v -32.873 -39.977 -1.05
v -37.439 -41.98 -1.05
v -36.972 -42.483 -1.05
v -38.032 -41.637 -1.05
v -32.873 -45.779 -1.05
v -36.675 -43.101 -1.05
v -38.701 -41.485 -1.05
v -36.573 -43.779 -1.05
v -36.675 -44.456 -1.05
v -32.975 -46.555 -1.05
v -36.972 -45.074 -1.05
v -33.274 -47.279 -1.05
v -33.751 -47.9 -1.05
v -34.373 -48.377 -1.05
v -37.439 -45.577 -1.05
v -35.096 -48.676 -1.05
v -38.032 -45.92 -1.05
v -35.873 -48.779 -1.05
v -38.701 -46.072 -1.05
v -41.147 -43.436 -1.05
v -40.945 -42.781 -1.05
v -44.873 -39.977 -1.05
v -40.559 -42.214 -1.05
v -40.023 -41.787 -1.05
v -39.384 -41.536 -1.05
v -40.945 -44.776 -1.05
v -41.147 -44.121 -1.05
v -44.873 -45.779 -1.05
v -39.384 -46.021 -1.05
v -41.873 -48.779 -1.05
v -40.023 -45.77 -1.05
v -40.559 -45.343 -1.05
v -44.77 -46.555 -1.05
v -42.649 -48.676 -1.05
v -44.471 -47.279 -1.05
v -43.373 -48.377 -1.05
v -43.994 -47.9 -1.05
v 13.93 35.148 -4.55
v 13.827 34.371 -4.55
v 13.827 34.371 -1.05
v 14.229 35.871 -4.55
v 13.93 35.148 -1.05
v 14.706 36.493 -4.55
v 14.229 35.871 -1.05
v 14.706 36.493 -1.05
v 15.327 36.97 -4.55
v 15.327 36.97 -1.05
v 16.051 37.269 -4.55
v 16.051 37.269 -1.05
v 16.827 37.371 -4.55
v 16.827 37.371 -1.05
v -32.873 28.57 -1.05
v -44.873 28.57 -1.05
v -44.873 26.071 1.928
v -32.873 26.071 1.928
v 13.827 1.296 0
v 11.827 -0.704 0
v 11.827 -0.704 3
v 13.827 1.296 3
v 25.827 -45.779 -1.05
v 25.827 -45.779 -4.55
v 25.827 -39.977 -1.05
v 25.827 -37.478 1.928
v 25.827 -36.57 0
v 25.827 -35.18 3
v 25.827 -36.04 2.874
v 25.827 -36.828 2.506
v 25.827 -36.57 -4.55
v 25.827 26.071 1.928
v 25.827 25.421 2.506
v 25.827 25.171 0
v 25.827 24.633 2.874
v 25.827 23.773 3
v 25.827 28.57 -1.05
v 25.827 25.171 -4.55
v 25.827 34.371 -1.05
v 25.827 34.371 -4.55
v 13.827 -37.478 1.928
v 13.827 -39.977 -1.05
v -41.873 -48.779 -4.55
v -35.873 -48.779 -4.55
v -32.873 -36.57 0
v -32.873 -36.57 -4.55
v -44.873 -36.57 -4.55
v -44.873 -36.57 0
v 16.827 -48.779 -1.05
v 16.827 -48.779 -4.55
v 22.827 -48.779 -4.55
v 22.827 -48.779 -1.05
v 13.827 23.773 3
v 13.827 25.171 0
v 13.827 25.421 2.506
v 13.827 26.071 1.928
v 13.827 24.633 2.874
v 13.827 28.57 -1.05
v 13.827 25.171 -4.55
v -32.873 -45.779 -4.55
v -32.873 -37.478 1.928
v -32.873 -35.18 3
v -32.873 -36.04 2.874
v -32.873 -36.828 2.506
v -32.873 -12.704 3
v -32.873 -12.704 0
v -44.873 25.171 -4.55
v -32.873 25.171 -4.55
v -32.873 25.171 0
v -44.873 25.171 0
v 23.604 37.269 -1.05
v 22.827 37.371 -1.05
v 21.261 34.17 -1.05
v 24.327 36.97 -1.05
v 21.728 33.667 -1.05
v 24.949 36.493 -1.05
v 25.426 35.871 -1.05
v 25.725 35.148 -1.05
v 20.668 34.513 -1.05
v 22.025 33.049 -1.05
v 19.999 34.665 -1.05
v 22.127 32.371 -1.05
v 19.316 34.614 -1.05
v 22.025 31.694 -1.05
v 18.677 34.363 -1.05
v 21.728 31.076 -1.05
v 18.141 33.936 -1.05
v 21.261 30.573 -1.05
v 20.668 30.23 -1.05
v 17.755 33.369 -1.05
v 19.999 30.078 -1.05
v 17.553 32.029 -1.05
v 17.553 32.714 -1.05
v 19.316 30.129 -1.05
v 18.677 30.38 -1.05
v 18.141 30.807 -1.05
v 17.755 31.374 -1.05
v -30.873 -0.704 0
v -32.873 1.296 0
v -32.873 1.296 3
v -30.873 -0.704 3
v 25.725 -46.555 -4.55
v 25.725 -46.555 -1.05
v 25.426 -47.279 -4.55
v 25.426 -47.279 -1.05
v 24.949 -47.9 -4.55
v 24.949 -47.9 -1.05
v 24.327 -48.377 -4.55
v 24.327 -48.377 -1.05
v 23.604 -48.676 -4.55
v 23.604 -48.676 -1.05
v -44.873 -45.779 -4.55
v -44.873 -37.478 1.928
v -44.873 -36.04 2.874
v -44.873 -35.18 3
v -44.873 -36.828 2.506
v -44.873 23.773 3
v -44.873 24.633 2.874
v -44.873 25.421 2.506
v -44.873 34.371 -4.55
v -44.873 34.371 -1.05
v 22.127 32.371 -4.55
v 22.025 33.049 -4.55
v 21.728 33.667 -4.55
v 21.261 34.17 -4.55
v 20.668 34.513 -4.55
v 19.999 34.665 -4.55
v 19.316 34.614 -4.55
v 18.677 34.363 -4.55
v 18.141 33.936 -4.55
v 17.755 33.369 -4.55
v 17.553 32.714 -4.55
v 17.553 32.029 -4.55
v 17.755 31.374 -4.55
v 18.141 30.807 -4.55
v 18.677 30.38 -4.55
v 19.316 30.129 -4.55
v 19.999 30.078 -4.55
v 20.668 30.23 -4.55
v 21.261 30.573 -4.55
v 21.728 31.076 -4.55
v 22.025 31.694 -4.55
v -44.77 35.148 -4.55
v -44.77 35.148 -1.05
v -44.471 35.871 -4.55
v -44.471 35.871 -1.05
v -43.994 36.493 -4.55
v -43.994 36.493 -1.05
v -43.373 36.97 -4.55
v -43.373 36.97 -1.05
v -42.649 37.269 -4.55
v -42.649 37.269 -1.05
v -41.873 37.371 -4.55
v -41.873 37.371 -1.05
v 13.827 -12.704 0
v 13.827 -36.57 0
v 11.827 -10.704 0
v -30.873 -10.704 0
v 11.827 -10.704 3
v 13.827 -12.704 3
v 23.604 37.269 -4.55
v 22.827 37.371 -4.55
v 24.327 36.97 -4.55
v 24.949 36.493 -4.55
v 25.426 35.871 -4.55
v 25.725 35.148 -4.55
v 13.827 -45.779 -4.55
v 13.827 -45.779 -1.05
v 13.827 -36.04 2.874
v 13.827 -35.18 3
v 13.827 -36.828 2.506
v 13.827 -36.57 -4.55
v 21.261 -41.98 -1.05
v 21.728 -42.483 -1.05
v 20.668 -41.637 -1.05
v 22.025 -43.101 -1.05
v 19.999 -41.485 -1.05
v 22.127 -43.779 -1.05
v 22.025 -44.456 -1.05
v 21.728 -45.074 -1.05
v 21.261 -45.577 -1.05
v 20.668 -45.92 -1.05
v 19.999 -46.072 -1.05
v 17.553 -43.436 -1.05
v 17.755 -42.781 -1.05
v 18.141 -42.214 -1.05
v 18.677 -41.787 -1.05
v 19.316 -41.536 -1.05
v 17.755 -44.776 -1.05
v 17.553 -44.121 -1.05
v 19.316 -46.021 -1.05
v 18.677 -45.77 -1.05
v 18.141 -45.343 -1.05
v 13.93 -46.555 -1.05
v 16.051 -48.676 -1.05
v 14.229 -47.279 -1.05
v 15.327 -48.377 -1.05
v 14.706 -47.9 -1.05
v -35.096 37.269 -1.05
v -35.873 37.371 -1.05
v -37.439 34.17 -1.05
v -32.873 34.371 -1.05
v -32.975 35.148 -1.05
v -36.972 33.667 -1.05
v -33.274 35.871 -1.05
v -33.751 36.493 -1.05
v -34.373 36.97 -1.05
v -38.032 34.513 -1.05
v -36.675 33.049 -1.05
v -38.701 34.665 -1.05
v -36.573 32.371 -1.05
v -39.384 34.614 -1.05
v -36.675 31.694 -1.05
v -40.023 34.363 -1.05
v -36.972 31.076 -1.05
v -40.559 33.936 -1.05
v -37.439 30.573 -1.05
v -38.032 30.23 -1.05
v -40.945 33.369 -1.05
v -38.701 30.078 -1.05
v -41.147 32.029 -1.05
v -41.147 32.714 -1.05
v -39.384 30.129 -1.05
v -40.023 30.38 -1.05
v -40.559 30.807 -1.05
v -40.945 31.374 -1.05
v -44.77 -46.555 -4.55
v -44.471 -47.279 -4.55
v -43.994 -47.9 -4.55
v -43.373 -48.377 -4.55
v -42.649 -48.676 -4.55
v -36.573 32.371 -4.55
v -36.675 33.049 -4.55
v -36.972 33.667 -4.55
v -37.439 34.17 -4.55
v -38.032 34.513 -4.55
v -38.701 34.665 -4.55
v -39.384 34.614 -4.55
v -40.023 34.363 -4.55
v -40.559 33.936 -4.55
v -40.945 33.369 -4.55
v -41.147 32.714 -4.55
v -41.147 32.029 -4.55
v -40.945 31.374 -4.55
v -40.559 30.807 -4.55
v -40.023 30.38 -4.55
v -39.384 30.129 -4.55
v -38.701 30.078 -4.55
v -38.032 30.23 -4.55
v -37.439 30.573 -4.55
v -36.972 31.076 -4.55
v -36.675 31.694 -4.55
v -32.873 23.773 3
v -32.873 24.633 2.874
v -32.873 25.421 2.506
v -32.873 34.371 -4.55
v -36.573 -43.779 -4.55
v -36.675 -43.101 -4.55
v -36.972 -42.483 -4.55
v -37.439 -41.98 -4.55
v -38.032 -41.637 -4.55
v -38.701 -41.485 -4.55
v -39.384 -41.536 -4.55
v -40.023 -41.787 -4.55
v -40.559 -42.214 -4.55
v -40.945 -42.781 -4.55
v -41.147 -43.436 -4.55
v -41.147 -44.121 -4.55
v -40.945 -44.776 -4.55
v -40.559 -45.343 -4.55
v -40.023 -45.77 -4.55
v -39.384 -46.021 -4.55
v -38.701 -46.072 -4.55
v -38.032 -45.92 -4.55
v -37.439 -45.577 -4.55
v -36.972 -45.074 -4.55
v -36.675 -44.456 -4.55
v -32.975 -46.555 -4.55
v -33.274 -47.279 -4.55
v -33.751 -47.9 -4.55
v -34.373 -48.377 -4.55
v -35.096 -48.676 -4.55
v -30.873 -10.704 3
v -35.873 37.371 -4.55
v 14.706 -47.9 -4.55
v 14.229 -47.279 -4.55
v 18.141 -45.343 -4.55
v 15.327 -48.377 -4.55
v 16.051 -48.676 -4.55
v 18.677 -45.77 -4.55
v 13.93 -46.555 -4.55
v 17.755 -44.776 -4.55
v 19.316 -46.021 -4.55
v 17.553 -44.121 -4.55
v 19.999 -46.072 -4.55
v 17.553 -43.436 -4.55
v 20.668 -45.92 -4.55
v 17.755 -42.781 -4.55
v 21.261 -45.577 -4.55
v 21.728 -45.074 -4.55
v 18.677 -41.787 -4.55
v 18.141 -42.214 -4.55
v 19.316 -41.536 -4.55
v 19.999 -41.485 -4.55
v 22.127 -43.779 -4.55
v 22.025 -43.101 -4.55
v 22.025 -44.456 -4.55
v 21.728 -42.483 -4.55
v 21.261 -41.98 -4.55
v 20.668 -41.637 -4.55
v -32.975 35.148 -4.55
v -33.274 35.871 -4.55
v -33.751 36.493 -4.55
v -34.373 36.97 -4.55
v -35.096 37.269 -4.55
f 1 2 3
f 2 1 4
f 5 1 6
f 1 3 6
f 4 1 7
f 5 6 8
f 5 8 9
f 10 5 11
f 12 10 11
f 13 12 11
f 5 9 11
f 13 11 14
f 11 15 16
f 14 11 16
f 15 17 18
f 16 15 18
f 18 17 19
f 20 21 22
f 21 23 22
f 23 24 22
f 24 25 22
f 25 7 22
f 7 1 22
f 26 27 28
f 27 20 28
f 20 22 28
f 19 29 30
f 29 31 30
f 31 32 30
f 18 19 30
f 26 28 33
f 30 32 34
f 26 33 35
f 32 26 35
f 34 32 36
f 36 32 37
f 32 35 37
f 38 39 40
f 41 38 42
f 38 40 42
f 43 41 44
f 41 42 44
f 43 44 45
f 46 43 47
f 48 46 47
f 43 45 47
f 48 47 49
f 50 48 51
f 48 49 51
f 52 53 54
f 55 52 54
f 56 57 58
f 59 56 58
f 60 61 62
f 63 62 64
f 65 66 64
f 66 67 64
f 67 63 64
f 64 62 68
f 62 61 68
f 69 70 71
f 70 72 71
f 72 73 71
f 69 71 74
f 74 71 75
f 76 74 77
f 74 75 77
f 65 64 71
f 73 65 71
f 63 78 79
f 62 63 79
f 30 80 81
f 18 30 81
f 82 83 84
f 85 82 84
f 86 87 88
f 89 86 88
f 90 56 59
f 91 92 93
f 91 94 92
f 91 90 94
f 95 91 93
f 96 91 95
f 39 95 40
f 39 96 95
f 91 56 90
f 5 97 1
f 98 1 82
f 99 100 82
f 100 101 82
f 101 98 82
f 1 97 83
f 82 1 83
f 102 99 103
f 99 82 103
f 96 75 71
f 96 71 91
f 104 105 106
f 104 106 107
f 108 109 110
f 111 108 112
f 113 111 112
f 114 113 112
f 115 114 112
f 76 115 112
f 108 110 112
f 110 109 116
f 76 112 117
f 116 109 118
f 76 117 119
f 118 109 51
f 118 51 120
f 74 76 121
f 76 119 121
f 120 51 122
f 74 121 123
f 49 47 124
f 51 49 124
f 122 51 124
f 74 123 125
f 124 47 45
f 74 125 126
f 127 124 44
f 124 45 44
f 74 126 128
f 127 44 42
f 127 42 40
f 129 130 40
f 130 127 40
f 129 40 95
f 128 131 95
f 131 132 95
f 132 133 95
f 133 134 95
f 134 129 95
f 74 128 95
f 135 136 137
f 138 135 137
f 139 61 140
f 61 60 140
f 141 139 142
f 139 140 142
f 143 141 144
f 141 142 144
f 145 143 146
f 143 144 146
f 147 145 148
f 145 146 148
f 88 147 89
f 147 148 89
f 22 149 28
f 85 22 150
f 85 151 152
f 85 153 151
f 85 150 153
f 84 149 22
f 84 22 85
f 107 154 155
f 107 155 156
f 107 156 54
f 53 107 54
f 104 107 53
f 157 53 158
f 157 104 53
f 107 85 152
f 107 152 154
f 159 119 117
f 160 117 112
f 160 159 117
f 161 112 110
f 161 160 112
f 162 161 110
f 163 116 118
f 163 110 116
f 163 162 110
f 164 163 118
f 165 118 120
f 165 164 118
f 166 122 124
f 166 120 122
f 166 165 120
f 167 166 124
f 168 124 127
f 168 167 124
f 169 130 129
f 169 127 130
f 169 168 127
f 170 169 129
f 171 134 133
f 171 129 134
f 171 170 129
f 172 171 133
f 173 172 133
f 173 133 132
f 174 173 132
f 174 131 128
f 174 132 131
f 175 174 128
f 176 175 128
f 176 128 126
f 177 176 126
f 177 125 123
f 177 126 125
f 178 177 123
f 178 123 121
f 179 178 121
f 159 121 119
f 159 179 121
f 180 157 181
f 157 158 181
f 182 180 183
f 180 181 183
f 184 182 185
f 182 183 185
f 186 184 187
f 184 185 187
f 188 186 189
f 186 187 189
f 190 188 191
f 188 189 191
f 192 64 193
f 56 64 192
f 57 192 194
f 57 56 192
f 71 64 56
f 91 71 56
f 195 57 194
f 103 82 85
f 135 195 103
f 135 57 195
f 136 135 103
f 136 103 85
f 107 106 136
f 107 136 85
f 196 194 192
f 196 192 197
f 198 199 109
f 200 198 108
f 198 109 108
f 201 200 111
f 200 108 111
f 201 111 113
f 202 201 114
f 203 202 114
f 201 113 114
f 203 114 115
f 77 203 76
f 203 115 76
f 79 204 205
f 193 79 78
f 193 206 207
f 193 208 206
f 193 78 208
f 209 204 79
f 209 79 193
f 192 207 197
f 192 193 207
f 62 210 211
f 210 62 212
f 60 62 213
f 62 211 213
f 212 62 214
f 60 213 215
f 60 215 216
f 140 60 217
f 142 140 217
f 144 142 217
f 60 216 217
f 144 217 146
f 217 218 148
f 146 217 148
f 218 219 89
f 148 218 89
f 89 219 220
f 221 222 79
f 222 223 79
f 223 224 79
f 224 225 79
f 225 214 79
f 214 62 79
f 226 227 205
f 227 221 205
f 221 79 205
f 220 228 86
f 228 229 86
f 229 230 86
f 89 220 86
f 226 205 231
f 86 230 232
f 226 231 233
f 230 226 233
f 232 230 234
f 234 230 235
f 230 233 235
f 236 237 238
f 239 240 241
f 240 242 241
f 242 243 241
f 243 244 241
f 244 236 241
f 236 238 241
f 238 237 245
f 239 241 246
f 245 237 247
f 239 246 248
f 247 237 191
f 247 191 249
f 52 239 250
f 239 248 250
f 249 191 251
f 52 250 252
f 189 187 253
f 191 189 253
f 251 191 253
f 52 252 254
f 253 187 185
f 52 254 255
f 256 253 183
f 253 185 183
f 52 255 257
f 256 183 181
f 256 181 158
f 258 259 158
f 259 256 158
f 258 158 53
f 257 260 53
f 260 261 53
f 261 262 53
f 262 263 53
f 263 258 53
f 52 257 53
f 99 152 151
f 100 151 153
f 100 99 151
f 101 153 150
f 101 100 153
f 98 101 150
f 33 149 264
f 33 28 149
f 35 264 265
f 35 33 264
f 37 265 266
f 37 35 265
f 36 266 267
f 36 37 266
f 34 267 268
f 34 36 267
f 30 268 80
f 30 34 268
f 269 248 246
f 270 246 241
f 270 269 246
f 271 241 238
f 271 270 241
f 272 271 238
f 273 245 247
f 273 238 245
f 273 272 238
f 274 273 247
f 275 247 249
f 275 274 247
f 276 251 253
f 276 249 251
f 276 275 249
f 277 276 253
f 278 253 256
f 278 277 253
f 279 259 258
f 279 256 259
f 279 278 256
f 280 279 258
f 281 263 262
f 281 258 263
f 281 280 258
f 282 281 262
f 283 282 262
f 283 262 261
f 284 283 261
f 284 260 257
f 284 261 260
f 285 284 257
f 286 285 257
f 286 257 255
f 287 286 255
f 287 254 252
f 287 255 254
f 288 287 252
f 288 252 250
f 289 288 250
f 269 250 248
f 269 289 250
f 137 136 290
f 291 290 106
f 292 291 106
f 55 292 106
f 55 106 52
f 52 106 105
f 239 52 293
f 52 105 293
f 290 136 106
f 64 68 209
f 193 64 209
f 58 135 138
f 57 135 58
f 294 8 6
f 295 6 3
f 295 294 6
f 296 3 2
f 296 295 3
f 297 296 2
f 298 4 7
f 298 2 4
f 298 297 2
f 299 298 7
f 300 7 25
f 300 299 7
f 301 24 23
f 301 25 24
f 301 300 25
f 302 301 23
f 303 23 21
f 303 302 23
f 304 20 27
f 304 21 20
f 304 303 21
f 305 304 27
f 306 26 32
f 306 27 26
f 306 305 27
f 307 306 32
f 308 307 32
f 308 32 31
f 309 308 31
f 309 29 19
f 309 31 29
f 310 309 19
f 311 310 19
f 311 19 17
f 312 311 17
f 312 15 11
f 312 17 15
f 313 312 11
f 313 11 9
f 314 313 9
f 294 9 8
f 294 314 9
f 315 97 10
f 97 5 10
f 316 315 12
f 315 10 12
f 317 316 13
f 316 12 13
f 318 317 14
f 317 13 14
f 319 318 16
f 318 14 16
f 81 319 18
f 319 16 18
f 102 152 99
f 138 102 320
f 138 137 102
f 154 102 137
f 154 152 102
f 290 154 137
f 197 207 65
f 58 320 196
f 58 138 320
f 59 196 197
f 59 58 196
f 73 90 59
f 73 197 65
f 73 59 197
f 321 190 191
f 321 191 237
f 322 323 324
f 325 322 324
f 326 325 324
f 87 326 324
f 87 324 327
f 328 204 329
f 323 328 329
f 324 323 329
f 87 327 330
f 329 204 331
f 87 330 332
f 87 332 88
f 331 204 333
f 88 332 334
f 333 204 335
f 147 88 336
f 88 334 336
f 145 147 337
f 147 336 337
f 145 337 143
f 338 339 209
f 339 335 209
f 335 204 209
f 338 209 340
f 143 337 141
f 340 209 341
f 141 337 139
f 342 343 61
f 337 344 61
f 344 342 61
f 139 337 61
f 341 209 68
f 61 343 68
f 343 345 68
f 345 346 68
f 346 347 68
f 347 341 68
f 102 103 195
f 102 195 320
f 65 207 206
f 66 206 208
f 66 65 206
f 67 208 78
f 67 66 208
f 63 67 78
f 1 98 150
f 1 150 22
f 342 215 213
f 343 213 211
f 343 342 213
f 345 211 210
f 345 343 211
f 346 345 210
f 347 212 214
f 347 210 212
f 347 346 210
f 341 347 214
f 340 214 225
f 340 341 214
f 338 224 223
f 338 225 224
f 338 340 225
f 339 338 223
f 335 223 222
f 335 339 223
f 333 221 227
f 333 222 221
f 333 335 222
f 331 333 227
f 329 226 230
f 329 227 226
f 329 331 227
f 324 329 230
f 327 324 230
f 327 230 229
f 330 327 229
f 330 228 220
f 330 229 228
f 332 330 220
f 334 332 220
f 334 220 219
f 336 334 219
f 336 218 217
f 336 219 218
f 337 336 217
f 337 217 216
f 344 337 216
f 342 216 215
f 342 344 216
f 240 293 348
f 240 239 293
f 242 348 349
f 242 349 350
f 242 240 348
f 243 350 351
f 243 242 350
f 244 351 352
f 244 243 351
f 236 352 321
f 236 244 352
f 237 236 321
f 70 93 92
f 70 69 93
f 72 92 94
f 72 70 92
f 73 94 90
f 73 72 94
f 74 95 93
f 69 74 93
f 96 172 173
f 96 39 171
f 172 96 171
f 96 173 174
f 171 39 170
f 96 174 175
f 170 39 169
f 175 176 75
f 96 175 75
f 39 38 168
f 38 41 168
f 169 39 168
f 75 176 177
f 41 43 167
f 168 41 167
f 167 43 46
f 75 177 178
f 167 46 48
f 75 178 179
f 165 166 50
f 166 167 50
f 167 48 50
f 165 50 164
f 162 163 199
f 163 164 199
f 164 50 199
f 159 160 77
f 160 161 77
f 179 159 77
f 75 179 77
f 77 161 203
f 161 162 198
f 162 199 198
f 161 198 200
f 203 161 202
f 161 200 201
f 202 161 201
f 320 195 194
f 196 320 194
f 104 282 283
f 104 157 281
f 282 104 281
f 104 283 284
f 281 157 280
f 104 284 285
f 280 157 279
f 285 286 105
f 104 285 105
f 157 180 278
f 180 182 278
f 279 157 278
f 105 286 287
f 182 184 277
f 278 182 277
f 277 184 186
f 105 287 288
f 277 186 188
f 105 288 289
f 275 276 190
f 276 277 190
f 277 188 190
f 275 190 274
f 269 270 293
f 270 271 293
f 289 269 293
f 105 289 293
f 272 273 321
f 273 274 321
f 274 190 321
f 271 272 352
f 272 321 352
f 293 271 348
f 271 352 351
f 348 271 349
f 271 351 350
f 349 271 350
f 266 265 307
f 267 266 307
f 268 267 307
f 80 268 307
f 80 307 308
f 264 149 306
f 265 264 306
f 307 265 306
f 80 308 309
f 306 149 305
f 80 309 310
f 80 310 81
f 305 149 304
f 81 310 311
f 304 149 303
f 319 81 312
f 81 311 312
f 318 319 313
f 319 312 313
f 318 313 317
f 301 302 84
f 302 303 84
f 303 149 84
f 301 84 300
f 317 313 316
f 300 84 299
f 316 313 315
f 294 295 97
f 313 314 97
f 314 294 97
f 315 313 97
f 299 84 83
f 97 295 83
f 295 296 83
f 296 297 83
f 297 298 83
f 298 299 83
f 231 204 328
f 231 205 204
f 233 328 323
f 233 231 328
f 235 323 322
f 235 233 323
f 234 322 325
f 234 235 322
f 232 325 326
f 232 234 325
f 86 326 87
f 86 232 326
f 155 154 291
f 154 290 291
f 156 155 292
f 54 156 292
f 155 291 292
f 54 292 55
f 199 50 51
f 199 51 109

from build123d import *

# Parameters (mm, degrees)
BOSS_EXTRUDE1_DEPTH      = 3
BOSS_EXTRUDE1_DEPTH_BACK = 4.55
SKETCH1_W                = 12
SKETCH1_H                = 10
SKETCH1_R                = 2.3
SKETCH1_H_2              = 28.075
SKETCH1_W_2              = 46.7
SKETCH5_W                = 12
SKETCH5_H                = 25.875
SKETCH5_H_2              = 10
SKETCH5_H_3              = 25.866
SKETCH5_W_2              = 46.7
CUT_EXTRUDE1_DEPTH       = 4.55
CUT_EXTRUDE2_DEPTH       = 87.014737759
CHAMFER1_SIZE            = 2
FILLET1_R                = 3
FILLET2_R                = 3


with BuildPart() as part:
    # Sketch1 → Boss-Extrude1 (new, two sides: drawn at the far end of the back side and taken through both)
    # profile 1 of 11: a face of its own
    with BuildSketch(Plane.XY.offset(-BOSS_EXTRUDE1_DEPTH_BACK)):
        with Locations((-38.872559152, 32.371494367)):
            Rectangle(SKETCH1_W, SKETCH1_H)
        with Locations((-38.872559152, 32.371494367)):
            Circle(SKETCH1_R, mode=Mode.SUBTRACT)
    # profile 2 of 11: a face of its own
    with BuildSketch(Plane.XY.offset(-BOSS_EXTRUDE1_DEPTH_BACK)):
        with Locations((-38.872559152, 13.333994367)):
            Rectangle(SKETCH1_W, SKETCH1_H_2)
    # profile 3 of 11: a face of its own
    with BuildSketch(Plane.XY.offset(-BOSS_EXTRUDE1_DEPTH_BACK)):
        with Locations((-38.872559152, -5.703505633)):
            Rectangle(SKETCH1_W, SKETCH1_H)
    # profile 4 of 11: a face of its own
    with BuildSketch(Plane.XY.offset(-BOSS_EXTRUDE1_DEPTH_BACK)):
        with Locations((-38.872559152, -24.741005633)):
            Rectangle(SKETCH1_W, SKETCH1_H_2)
    # profile 5 of 11: a face of its own
    with BuildSketch(Plane.XY.offset(-BOSS_EXTRUDE1_DEPTH_BACK)):
        with Locations((-38.872559152, -43.778505633)):
            Rectangle(SKETCH1_W, SKETCH1_H)
        with Locations((-38.872559152, -43.778505633)):
            Circle(SKETCH1_R, mode=Mode.SUBTRACT)
    # profile 6 of 11: a face of its own
    with BuildSketch(Plane.XY.offset(-BOSS_EXTRUDE1_DEPTH_BACK)):
        with Locations((19.827440848, -24.741005633)):
            Rectangle(SKETCH1_W, SKETCH1_H_2)
    # profile 7 of 11: a face of its own
    with BuildSketch(Plane.XY.offset(-BOSS_EXTRUDE1_DEPTH_BACK)):
        with Locations((19.827440848, -43.778505633)):
            Rectangle(SKETCH1_W, SKETCH1_H)
        with Locations((19.827440848, -43.778505633)):
            Circle(SKETCH1_R, mode=Mode.SUBTRACT)
    # profile 8 of 11: a face of its own
    with BuildSketch(Plane.XY.offset(-BOSS_EXTRUDE1_DEPTH_BACK)):
        with Locations((19.827440848, -5.703505633)):
            Rectangle(SKETCH1_W, SKETCH1_H)
    # profile 9 of 11: a face of its own
    with BuildSketch(Plane.XY.offset(-BOSS_EXTRUDE1_DEPTH_BACK)):
        with Locations((-9.522559152, -5.703505633)):
            Rectangle(SKETCH1_W_2, SKETCH1_H)
    # profile 10 of 11: a face of its own
    with BuildSketch(Plane.XY.offset(-BOSS_EXTRUDE1_DEPTH_BACK)):
        with Locations((19.827440848, 13.333994367)):
            Rectangle(SKETCH1_W, SKETCH1_H_2)
    # profile 11 of 11: a face of its own
    with BuildSketch(Plane.XY.offset(-BOSS_EXTRUDE1_DEPTH_BACK)):
        with Locations((19.827440848, 32.371494367)):
            Rectangle(SKETCH1_W, SKETCH1_H)
        with Locations((19.827440848, 32.371494367)):
            Circle(SKETCH1_R, mode=Mode.SUBTRACT)
    extrude(amount=BOSS_EXTRUDE1_DEPTH + BOSS_EXTRUDE1_DEPTH_BACK)

    # Sketch5 → Cut-Extrude1 (cut)
    with BuildSketch(Plane(origin=(0, 0, -4.55), x_dir=(-1, 0, 0), z_dir=(0, 0, -1))):
        with Locations((-19.827440848, 12.233994367)):
            Rectangle(SKETCH5_W, SKETCH5_H)
        with Locations((-19.827440848, -5.703505633)):
            Rectangle(SKETCH5_W, SKETCH5_H_2)
        with Locations((-19.827440848, -23.636505633)):
            Rectangle(SKETCH5_W, SKETCH5_H_3)
        with Locations((9.522559152, -5.703505633)):
            Rectangle(SKETCH5_W_2, SKETCH5_H_2)
        with Locations((38.872559152, -5.703505633)):
            Rectangle(SKETCH5_W, SKETCH5_H_2)
        with Locations((38.872559152, -23.636505633)):
            Rectangle(SKETCH5_W, SKETCH5_H_3)
        with Locations((38.872559152, 12.233994367)):
            Rectangle(SKETCH5_W, SKETCH5_H)
    extrude(amount=-CUT_EXTRUDE1_DEPTH, mode=Mode.SUBTRACT)

    # Sketch6 → Cut-Extrude2 (cut, through all)
    with BuildSketch(Plane.ZY.offset(44.872559152)):
        Polygon((-1.05, 28.569847873), (3, 25.171494367), (3, 37.371494367), (-1.05, 37.371494367), align=None)
        Polygon((-1.05, -48.778505633), (3, -48.778505633), (3, -36.578505633), (-1.05, -39.976859139), align=None)
    extrude(amount=-CUT_EXTRUDE2_DEPTH, mode=Mode.SUBTRACT)

    # Chamfer1
    chamfer1_edges = [part.edges().sort_by_distance(p)[0] for p in [
        (-32.872559152, -10.703505633, 1.5),
        (13.827440848, -10.703505633, 1.5),
        (13.827440848, -0.703505633, 1.5),
        (-32.872559152, -0.703505633, 1.5),
    ]]
    chamfer(chamfer1_edges, length=CHAMFER1_SIZE)

    # Fillet1
    fillet1_edges = [part.edges().sort_by_distance(p)[0] for p in [
        (13.827440848, 37.371494367, -2.8),
        (25.827440848, 37.371494367, -2.8),
        (25.827440848, -48.778505633, -2.8),
        (13.827440848, -48.778505633, -2.8),
        (-32.872559152, -48.778505633, -2.8),
        (-44.872559152, -48.778505633, -2.8),
        (-44.872559152, 37.371494367, -2.8),
        (-32.872559152, 37.371494367, -2.8),
    ]]
    fillet(fillet1_edges, radius=FILLET1_R)

    # Fillet2
    fillet2_edges = [part.edges().sort_by_distance(p)[0] for p in [
        (-38.872559152, -36.578505633, 3),
        (-38.872559152, 25.171494367, 3),
        (19.827440848, 25.171494367, 3),
        (19.827440848, -36.578505633, 3),
    ]]
    fillet(fillet2_edges, radius=FILLET2_R)


solid = part.part
